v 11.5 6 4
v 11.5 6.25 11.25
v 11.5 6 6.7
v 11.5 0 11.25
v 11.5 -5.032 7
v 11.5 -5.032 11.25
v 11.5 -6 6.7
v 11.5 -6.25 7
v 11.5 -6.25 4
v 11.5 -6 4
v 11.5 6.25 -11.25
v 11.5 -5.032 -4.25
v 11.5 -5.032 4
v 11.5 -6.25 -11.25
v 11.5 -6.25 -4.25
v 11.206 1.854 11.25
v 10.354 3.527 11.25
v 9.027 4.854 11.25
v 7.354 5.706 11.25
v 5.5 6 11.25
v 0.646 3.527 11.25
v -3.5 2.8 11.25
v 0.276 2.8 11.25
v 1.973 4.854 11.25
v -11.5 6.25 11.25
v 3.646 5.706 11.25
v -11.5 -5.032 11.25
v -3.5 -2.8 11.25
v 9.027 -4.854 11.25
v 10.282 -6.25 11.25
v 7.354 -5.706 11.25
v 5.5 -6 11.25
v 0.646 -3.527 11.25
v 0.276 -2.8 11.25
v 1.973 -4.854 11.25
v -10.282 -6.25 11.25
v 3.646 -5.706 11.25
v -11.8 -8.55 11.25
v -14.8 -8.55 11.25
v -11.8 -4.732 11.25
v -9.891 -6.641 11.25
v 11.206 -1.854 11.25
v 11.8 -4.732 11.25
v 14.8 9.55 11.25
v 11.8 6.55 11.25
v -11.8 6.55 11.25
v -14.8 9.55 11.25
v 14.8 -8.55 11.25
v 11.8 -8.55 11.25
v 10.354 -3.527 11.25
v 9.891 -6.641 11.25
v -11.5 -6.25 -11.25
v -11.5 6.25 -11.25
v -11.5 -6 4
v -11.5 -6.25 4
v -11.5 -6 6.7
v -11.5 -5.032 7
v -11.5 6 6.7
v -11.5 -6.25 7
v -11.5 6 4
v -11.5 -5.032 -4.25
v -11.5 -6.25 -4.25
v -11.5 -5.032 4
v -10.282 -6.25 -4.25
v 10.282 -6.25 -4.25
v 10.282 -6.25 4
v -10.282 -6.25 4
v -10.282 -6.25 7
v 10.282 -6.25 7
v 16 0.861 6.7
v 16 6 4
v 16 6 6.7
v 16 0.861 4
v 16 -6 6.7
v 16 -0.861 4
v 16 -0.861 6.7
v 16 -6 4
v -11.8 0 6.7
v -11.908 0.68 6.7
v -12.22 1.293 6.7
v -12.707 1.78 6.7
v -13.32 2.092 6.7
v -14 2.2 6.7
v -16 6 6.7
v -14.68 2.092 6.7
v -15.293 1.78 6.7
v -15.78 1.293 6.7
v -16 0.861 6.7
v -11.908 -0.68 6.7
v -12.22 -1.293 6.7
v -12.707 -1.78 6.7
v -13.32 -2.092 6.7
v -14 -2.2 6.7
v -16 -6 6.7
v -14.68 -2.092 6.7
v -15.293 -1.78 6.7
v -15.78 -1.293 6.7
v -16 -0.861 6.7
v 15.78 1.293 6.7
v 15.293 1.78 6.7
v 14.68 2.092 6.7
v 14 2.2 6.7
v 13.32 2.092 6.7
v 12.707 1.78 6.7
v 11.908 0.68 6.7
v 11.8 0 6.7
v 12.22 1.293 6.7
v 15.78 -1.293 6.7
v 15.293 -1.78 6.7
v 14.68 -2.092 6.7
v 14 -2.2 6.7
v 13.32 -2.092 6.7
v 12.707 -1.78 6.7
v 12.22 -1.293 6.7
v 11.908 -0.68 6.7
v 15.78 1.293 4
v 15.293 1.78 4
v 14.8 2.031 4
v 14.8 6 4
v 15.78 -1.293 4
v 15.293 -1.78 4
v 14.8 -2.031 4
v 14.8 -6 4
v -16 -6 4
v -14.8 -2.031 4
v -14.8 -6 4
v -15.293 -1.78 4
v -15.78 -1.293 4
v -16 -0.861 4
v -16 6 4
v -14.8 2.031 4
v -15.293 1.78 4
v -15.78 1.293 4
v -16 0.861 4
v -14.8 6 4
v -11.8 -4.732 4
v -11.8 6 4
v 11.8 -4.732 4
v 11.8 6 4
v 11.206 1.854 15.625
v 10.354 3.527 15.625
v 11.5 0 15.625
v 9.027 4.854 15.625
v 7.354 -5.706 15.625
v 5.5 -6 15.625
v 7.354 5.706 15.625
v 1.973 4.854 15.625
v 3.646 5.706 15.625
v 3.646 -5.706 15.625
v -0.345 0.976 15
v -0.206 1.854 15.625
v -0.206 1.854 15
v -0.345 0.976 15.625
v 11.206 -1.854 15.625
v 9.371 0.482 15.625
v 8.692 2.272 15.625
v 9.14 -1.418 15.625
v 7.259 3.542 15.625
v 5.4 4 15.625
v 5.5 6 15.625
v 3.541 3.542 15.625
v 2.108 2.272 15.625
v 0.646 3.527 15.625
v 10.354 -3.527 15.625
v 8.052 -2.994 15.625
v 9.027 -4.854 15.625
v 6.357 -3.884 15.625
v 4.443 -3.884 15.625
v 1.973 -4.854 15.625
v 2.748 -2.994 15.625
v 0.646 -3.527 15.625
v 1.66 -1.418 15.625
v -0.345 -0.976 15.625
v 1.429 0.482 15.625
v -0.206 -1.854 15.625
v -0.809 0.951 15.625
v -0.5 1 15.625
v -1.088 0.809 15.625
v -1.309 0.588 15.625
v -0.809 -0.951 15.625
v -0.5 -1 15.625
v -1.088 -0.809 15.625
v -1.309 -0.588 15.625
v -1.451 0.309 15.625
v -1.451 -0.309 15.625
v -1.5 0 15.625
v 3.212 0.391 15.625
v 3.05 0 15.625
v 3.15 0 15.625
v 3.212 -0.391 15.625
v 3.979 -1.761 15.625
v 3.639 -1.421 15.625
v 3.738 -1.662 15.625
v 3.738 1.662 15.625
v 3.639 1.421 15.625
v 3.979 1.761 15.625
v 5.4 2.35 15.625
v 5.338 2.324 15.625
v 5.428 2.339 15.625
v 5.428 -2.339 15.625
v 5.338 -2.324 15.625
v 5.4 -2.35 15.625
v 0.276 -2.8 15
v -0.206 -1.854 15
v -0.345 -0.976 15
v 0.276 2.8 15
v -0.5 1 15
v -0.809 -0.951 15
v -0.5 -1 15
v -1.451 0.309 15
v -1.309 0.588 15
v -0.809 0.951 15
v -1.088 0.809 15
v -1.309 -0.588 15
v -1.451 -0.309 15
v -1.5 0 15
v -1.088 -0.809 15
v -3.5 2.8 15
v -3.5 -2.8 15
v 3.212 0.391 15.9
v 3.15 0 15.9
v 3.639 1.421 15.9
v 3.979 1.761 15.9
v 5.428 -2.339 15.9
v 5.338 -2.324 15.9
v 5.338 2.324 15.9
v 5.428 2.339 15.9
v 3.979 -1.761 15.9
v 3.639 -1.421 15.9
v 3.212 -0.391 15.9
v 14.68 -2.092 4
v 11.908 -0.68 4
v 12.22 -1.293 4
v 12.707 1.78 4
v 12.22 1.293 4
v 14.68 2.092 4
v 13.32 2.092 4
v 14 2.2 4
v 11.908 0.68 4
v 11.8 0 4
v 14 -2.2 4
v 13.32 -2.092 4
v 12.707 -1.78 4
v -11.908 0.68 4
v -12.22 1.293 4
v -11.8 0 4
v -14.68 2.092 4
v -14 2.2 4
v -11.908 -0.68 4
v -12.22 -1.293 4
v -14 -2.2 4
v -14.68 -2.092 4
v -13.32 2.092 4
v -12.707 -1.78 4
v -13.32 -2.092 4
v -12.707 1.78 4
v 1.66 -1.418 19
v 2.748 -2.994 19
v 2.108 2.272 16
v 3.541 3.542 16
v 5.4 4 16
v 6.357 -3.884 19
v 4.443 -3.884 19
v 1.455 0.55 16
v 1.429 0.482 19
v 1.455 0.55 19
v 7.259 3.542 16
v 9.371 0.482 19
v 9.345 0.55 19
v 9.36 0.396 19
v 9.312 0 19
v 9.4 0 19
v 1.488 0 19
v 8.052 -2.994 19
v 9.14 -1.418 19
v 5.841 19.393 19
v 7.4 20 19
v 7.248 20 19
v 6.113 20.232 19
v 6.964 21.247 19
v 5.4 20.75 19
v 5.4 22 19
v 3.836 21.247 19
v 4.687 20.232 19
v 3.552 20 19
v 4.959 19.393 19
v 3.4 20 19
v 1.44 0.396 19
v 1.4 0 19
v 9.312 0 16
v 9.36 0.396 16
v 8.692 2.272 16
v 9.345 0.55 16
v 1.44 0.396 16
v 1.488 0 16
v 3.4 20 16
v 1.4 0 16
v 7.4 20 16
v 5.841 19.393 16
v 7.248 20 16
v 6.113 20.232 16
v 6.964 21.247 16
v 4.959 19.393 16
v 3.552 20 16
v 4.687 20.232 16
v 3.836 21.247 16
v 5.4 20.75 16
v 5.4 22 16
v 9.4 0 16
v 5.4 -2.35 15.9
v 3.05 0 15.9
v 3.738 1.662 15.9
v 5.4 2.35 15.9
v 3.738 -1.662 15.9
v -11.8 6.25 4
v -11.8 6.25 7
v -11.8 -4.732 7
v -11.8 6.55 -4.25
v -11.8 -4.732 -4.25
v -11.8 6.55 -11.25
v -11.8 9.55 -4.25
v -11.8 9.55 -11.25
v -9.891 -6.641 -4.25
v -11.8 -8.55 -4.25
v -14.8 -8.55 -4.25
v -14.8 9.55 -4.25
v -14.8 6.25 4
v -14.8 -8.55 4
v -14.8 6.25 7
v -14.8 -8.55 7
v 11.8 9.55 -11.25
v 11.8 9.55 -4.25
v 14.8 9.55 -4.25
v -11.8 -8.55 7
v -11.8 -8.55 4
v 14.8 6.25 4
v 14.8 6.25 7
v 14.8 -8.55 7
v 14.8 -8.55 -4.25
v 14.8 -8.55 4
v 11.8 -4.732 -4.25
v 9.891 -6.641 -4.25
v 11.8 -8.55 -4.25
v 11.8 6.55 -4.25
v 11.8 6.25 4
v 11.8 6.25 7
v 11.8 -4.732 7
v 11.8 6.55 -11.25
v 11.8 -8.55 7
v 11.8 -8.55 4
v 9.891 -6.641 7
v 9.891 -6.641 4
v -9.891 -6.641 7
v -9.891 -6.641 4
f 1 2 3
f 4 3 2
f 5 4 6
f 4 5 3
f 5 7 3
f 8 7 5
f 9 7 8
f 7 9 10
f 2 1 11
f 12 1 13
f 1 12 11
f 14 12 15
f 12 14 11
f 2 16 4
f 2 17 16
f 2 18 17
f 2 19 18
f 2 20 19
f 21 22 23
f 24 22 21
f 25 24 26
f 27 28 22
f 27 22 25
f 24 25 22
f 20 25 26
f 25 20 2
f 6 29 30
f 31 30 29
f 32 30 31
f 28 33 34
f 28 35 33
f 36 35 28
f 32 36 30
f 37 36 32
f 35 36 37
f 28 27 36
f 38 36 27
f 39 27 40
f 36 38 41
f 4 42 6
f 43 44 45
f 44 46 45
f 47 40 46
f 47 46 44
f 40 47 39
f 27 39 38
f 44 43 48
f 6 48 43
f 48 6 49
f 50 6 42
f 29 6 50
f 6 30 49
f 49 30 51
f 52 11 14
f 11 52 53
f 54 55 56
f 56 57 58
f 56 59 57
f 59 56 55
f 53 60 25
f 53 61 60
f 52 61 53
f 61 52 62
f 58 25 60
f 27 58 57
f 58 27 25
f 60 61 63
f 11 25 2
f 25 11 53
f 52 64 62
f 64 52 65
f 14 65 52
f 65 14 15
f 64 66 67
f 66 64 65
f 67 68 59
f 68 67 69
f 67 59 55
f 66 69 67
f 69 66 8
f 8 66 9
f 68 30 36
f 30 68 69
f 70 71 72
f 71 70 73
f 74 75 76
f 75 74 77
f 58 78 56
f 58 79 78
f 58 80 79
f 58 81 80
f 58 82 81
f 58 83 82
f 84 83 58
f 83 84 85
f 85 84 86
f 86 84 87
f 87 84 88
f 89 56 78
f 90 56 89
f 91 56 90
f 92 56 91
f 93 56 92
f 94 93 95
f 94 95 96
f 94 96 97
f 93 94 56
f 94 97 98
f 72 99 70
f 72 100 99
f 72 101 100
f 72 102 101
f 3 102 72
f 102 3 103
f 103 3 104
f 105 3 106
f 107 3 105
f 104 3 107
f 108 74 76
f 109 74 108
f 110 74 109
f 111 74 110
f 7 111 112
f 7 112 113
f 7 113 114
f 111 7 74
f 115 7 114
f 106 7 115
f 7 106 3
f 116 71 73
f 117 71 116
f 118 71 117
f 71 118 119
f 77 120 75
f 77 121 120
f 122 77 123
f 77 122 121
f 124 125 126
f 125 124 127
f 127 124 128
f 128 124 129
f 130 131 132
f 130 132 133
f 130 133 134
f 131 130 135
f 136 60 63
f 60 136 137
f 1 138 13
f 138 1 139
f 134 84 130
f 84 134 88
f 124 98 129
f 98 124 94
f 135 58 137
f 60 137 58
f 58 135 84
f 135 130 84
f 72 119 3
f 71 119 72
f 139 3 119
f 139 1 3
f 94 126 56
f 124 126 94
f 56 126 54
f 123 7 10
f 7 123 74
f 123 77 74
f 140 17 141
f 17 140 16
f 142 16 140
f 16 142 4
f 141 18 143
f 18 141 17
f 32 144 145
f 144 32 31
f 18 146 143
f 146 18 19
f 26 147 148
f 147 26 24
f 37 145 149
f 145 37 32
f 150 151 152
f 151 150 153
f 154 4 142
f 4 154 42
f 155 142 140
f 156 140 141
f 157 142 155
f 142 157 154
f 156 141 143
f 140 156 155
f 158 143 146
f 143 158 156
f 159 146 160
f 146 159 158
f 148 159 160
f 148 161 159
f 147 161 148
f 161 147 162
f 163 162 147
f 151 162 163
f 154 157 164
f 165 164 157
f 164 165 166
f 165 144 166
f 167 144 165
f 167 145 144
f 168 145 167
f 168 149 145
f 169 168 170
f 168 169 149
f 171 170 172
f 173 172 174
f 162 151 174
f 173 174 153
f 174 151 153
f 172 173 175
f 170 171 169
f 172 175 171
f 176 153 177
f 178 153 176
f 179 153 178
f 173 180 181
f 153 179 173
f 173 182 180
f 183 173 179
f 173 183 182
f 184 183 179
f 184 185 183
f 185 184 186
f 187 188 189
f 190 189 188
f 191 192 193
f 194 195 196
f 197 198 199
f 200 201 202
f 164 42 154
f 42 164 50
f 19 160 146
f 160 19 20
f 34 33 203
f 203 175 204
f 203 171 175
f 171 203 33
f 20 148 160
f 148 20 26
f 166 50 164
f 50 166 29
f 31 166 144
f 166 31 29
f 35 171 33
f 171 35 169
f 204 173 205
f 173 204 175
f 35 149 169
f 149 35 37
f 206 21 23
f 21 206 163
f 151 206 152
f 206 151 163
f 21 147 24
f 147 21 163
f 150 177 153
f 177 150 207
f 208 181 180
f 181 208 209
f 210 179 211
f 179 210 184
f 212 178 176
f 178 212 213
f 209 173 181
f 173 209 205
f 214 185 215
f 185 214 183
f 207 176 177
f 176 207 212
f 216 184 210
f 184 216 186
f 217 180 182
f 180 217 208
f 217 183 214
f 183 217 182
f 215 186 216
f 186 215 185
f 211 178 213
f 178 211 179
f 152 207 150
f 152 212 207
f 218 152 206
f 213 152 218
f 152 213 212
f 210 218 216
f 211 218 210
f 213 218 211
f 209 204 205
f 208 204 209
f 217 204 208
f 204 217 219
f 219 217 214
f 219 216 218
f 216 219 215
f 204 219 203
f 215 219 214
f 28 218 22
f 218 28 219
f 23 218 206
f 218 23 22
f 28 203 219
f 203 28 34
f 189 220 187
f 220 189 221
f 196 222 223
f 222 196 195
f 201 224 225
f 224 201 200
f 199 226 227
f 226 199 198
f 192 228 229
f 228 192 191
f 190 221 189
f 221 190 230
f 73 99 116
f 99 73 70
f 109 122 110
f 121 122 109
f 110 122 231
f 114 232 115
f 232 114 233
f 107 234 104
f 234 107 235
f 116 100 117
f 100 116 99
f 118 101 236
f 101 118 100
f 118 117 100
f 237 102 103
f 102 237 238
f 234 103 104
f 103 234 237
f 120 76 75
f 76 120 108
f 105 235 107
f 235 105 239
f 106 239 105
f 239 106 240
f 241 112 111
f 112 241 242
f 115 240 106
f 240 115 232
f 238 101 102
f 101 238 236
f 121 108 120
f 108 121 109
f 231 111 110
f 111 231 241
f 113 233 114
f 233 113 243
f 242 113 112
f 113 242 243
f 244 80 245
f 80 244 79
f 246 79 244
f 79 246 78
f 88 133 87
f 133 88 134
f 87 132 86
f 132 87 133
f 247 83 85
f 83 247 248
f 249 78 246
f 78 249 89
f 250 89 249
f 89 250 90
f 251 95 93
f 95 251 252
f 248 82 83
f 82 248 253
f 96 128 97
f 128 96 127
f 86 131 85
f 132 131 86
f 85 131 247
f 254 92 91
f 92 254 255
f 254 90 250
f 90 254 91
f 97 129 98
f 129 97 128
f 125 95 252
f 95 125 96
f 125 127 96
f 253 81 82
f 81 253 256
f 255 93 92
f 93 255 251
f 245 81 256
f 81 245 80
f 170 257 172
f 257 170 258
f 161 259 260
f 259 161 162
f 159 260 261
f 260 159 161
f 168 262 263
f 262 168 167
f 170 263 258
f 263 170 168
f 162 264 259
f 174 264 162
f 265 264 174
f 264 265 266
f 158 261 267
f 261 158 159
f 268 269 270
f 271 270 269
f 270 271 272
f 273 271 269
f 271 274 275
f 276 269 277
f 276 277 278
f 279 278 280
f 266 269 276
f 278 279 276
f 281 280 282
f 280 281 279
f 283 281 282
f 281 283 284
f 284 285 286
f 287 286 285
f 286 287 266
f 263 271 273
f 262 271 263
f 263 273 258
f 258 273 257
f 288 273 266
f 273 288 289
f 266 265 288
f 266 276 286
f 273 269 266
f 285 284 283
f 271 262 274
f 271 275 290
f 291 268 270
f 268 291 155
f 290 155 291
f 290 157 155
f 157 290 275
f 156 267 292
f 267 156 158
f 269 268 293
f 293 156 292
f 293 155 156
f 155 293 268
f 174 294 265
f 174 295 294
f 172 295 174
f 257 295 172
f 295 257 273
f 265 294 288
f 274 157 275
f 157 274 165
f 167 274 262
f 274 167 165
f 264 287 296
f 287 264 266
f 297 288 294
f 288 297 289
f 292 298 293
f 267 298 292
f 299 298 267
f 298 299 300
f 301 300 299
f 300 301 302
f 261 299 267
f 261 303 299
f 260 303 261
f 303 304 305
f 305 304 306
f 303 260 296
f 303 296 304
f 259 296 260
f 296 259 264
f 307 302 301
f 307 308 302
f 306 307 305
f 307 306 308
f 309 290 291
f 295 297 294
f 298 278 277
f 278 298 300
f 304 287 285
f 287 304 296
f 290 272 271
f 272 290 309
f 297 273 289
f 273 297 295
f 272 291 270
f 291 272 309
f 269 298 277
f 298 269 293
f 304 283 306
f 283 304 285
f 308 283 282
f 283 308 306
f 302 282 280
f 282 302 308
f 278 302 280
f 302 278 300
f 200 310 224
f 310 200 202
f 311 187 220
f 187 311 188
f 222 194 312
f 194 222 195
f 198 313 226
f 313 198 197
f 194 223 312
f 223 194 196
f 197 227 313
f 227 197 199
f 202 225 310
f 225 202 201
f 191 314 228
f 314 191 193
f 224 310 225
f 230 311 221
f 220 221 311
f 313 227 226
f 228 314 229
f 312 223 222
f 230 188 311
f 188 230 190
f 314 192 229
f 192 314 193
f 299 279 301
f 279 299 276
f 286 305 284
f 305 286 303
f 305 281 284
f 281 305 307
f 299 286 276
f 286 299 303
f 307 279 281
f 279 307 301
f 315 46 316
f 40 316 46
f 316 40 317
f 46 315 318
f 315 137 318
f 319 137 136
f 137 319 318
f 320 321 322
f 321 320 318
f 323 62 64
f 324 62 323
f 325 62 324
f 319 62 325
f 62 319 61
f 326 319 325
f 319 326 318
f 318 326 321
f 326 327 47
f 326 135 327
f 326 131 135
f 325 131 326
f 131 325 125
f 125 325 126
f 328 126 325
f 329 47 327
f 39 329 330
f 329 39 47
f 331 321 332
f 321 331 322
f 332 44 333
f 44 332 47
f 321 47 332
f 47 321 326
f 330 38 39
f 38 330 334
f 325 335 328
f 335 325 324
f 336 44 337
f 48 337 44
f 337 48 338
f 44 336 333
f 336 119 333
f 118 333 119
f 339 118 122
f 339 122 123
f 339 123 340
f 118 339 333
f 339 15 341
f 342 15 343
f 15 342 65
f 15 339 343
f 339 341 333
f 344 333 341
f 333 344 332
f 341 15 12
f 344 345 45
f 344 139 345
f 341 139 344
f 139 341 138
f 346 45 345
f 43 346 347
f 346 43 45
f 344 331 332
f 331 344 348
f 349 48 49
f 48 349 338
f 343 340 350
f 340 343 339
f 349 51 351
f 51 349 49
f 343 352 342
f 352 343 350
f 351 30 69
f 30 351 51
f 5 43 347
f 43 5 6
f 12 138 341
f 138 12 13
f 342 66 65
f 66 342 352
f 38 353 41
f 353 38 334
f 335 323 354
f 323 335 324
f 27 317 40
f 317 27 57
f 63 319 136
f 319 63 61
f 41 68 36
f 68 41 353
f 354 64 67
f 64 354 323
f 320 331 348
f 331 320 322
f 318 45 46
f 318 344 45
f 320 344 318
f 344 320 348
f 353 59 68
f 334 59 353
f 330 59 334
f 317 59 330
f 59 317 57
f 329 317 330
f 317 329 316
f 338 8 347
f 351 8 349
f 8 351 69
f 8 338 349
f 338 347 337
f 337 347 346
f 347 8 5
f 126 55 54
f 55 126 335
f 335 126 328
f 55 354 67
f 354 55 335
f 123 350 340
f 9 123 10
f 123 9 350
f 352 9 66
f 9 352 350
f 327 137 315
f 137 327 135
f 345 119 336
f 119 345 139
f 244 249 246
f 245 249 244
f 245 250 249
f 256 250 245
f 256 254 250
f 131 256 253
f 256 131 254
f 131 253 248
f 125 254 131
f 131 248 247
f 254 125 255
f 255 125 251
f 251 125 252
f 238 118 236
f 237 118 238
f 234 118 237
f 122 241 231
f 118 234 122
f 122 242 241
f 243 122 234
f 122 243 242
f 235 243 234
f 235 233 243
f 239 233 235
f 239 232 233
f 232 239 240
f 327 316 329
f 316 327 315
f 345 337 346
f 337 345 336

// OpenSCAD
drehachseR = 2.35;
servoX = 23;
servoY = 12.5;
servoZ = 22.5;

offsetBefestigungZ=4;   // wie weit ist die Unterkante der Befestigungsplatte von der Mittelachse entfernt
befestigungZ = 2.7;

module 9g_motor(){
	difference(){			
		union(){
			color("Gray") cube([servoX,servoY,servoZ], center=true);
			befestigungZ = 2.7;
            color("Gray") translate([0,0,offsetBefestigungZ+befestigungZ/2])
                cube([32,12,befestigungZ], center=true);
			color("Gray") translate([5.5,0,2.75]) cylinder(r=6, h=25.75, $fn=20, center=true);
			color("Gray") translate([-.5,0,2.75]) cylinder(r=1, h=25.75, $fn=20, center=true);
			color("Gray") translate([-1,0,2.75]) cube([5,5.6,24.5], center=true);		
			color("white") translate([5.5,0,3.65]) cylinder(r=2.35, h=29.25, $fn=20, center=true);
		}
		// die Abschrägung gibt es nicht immer
        //translate([10,0,-11]) rotate([0,-30,0]) cube([8,13,4], center=true);
		for ( hole = [14,-14] ){
			translate([hole,0,5]) cylinder(r=2.2, h=4, $fn=20, center=true);
		}	
	}
}

module 9g_arm(laenge,winkel){
    dicke = 3;
    rAchse = 4;
    rEnde = 2;
    #translate([5.4,0,16])rotate([0,0,winkel]){
        difference(){
            union(){
                translate([0,0,-2]) cylinder(r=rAchse, h=dicke+2);
                linear_extrude(height = dicke, convexity = 10)
                    polygon(points=[[0,rAchse],[0,-rAchse],[laenge,rEnde],[laenge,-rEnde]]
                        , paths=[[0,1,3,2]]);
                translate([laenge,0,0]) cylinder(r=rEnde, h=dicke);
            }
            // die Achse
            translate([0,0,-2.1]) cylinder(r=drehachseR, h=2);
            // das Loch zur Befestigung der Hebelstange
            translate([laenge,0,-.1]) cylinder(d=1.5, h=dicke+.2);
        }
    }
}

module 9g_holder(){
    luft = .3;
    dicke = 3;
    hoehe = servoZ; // der Halter ist so hoch wie das Servo
    naseY = 3.3;    // soll etwas unter Spannung sein, war 3.5
    difference(){
        union(){
            // lange Seite
            translate([-servoX/2-luft,servoY/2+luft,servoZ/2-hoehe])
                cube([servoX+2*luft,dicke,hoehe]);
            // kurze Seiten
            seiteY = servoY+dicke+luft+naseY-1; // jetzt 1mm kürzer
            hoeheS=hoehe-7; //die Federklammern sind auf der ganzen Höhe zu fest.
                            //das Kabel muss auch raus geführt werden
            for(x=[-servoX/2-dicke-luft, servoX/2+luft]){
                translate([x,-servoY/2-naseY+1,servoZ/2-hoeheS]) cube([dicke,seiteY,hoeheS]);
            }
            // die Haltenasen
            dicke2=dicke*.9;   // war 1.1
            for(x=[servoX/2+luft,-servoX/2-luft]){
                //Y jetzt 1mm kuerzer (+1)
                translate([x,-servoY/2-naseY+1,servoZ/2-hoeheS])
                    rotate([0,0,45]) cube([dicke2,dicke2,hoeheS]);
            }
        }
        // der Schlitz für die Befestigung
        schlitzZ = befestigungZ+luft;
        schlitzY = servoY+naseY+.1;
        gesamtX = servoX+2*luft+2*dicke;
        gesamtY = dicke+luft+servoY+naseY;
        translate([-gesamtX/2-.1,-schlitzY+servoY/2,offsetBefestigungZ])
            cube([gesamtX+.2,schlitzY,schlitzZ]);
    }
}

9g_motor();
9g_arm(laenge=20,winkel=90);
9g_holder();
